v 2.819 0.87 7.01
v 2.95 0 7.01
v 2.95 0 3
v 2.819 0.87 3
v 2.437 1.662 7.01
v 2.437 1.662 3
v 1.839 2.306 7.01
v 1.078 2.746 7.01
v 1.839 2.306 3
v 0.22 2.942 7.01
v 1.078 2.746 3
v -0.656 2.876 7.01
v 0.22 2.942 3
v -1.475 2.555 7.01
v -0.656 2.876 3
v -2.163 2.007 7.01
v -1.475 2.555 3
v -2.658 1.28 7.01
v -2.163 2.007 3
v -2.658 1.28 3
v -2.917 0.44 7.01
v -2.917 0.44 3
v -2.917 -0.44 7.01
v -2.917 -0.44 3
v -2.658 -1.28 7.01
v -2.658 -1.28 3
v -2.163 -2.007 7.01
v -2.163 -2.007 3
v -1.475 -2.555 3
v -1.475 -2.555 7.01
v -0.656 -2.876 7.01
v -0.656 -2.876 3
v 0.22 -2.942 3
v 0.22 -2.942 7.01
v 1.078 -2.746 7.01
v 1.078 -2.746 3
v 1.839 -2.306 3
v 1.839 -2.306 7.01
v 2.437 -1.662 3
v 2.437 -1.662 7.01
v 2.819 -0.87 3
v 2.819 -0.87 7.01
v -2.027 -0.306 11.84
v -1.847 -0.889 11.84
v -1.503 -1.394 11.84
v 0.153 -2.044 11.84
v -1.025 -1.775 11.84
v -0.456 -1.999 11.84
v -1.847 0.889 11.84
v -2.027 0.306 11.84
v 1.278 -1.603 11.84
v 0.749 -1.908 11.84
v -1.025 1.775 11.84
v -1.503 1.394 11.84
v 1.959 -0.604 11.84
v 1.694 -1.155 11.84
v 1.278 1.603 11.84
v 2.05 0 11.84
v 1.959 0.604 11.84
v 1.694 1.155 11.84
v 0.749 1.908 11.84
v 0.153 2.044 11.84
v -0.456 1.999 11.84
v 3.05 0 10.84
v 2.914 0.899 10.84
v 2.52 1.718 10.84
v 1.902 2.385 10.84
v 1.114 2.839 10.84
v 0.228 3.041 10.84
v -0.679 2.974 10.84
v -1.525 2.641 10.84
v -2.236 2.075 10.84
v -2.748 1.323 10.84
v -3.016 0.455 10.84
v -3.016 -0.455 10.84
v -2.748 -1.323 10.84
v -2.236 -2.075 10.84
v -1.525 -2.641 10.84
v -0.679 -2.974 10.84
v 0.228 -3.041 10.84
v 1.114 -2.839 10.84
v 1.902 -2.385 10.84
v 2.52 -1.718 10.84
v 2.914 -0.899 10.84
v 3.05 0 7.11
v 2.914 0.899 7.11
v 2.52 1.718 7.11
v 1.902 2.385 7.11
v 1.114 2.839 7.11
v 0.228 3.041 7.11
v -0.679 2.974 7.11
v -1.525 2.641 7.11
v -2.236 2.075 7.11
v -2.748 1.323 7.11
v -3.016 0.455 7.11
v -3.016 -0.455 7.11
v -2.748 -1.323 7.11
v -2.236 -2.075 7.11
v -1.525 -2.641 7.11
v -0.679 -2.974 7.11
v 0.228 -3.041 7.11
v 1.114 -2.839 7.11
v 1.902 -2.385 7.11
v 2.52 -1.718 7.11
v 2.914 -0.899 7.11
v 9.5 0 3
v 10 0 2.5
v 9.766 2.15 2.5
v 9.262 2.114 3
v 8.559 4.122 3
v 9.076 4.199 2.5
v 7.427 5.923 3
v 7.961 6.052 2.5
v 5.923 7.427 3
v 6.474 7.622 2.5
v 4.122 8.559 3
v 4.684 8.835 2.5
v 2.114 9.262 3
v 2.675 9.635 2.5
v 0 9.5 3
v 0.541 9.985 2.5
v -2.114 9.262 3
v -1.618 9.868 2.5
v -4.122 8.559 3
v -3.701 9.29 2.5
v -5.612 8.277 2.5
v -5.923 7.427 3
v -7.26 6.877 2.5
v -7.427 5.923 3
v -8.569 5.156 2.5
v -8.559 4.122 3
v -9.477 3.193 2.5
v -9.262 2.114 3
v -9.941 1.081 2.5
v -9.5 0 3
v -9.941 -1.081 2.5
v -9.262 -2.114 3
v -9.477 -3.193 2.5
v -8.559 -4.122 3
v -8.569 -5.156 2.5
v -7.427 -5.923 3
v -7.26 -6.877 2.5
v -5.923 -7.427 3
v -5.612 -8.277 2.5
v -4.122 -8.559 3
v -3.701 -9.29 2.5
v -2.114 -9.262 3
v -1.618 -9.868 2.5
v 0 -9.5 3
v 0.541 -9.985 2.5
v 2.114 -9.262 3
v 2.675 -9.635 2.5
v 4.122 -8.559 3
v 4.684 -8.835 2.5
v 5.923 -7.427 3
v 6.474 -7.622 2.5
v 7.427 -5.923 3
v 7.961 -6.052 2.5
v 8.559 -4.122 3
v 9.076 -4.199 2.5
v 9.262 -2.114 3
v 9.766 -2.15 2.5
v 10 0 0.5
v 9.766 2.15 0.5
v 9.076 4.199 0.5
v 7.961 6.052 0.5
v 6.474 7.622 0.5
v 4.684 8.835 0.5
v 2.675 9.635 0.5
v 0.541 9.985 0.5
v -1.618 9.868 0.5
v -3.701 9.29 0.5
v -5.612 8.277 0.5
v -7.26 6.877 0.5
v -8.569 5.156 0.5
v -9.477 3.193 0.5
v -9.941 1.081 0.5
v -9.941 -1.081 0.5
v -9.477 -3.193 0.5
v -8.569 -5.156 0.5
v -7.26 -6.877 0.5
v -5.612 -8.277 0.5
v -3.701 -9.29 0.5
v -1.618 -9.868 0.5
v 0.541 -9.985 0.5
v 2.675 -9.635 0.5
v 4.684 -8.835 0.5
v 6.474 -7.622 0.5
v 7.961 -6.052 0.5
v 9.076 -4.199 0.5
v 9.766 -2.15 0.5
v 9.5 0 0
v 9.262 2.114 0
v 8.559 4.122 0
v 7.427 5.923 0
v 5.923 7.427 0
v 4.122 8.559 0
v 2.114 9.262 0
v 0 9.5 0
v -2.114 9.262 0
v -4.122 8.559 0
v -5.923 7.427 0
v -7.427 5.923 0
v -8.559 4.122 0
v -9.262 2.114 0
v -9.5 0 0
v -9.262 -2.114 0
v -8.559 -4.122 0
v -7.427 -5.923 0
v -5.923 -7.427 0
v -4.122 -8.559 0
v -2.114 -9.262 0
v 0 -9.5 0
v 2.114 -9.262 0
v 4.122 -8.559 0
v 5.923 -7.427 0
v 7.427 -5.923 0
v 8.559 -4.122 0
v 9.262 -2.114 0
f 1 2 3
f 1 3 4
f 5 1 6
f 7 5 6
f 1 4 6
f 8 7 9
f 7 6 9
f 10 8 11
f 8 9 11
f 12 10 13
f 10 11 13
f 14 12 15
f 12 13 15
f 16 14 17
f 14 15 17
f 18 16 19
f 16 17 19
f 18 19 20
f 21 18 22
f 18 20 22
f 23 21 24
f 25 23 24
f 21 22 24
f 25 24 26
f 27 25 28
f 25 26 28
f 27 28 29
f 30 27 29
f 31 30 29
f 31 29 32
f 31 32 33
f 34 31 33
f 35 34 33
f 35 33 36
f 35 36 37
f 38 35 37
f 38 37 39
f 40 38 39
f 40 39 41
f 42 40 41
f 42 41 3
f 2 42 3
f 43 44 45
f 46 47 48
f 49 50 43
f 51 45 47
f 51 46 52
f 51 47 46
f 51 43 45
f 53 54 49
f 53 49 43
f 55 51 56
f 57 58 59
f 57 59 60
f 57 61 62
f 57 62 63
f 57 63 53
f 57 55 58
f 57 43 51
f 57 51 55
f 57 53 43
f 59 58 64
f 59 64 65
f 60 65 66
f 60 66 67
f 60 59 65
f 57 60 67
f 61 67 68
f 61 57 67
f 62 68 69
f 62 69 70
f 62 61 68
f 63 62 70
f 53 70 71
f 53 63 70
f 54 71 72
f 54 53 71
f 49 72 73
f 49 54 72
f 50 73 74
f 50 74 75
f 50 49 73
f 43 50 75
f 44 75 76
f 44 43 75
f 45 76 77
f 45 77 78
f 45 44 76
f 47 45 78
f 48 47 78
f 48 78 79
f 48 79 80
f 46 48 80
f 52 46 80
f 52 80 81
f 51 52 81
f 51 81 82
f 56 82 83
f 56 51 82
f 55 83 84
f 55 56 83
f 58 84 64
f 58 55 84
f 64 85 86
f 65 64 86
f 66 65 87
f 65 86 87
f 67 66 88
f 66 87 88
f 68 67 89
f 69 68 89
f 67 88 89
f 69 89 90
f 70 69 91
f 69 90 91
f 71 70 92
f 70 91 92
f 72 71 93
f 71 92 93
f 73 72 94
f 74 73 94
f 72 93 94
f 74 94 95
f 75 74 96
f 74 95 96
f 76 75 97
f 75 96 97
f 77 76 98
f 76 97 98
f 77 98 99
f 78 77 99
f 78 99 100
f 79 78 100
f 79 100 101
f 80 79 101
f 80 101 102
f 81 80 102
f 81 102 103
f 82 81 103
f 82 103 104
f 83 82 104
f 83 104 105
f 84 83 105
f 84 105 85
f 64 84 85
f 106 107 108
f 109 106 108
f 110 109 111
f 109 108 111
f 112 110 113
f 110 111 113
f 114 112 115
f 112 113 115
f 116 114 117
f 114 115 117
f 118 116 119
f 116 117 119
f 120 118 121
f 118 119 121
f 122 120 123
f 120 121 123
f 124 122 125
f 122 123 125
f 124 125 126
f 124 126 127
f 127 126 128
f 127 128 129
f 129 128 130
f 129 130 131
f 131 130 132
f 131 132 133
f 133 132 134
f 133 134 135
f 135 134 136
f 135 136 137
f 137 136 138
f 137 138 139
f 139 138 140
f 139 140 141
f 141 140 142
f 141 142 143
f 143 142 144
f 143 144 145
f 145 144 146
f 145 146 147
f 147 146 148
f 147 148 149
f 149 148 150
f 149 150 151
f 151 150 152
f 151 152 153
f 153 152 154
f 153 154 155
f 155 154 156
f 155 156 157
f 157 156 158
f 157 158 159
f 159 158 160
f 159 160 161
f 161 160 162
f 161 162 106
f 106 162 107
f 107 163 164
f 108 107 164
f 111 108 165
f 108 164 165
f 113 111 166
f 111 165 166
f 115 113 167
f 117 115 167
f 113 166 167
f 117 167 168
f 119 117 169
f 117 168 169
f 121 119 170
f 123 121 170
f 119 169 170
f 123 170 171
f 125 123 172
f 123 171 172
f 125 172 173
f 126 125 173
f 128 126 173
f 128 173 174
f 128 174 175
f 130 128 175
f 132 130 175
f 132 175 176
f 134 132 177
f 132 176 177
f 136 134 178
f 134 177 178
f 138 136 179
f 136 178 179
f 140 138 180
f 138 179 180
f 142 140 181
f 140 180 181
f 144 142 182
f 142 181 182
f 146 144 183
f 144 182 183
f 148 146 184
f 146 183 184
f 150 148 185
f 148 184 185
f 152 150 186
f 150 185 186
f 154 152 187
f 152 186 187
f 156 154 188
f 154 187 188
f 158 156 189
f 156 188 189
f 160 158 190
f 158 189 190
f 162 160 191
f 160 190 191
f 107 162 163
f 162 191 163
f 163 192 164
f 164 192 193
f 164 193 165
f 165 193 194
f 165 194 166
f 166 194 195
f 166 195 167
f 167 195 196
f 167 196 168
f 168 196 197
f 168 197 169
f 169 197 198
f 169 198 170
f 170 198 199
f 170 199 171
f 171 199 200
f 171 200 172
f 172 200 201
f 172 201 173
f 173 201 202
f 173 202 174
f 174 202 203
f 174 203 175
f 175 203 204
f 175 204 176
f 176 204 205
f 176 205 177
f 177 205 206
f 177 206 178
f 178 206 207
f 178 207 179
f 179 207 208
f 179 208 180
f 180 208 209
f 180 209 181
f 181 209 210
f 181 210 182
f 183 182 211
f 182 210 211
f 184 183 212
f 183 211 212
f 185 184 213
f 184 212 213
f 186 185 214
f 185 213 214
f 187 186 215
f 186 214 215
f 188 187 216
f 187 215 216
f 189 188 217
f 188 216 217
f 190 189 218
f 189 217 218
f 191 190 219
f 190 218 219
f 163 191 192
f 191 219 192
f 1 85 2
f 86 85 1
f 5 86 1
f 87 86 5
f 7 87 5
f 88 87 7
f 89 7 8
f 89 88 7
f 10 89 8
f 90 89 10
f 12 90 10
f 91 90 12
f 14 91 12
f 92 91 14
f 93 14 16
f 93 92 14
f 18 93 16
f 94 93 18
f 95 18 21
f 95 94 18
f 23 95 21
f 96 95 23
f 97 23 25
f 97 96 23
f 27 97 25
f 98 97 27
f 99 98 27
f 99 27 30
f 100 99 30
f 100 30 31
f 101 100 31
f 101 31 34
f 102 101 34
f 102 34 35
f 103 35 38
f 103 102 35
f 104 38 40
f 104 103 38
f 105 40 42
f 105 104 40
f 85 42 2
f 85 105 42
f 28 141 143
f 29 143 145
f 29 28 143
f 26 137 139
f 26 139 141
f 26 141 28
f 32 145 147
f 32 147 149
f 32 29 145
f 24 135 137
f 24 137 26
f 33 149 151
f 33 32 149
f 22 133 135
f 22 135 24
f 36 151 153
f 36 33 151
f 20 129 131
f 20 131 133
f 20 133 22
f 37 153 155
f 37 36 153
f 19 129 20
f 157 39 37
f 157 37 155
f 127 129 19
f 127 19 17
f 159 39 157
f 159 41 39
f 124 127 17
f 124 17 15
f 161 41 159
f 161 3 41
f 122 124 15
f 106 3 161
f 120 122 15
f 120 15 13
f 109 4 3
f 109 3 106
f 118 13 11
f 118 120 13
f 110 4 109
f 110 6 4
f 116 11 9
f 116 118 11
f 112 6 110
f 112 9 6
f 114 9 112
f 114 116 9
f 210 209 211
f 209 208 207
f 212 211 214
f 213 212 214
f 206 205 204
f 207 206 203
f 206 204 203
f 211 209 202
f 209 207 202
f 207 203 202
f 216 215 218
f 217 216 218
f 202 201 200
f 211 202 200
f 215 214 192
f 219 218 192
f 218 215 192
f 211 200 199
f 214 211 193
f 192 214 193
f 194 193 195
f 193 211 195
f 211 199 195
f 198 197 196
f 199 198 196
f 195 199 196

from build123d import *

# Parameters (mm, degrees)
F0_R        = 10
F1_DEPTH    = 3
F2_R        = 2.95
F3_DEPTH    = 3.61
F4_R        = 3.05
F4_R_2      = 2.95
F5_DEPTH    = 5.23
F6_SIZE     = 1
F7_SIZE     = 0.5
F8_S5_R     = 2.95
F8_T6_DEPTH = 6


# Not quite as in the source:
# - a fillet or chamfer that OpenCascade refuses, or shapes differently, is made with other operations: its cross-section is extruded or revolved along the edge and cut away or added


with BuildPart() as f1:
    # F0 (on Top) → F1 (new body)
    with BuildSketch(Plane.XY):
        Circle(F0_R)
    extrude(amount=F1_DEPTH)

    # F2 (on face) → F3 (join)
    with BuildSketch(Plane.XY.offset(3)):
        Circle(F2_R)
    extrude(amount=F3_DEPTH)

    # F4 (on face) → F5 (join)
    with BuildSketch(Plane.XY.offset(6.61)):
        Circle(F4_R)
        Circle(F4_R_2, mode=Mode.SUBTRACT)
        Circle(F4_R_2)
    extrude(amount=F5_DEPTH)

    # F6
    f6_edges = [f1.edges().sort_by_distance(p)[0] for p in [
        (-3.05, 0, 11.84),
    ]]
    chamfer(f6_edges, length=F6_SIZE)

    # F7
    f7_edges = [f1.edges().sort_by_distance(p)[0] for p in [
        (-10, 0, 3),
        (-10, 0, 0),
    ]]
    chamfer(f7_edges, length=F7_SIZE)

    # F8: chamfer of 0.5 on 1 edges, made by hand


with BuildPart() as f8_tool2:
    # F8_s3 → F8_t4 (revolve)
    with BuildSketch(Plane.XZ):
        Polygon((2.55, 6.61), (3.05, 7.11), (3.05, 6.61), align=None)
    revolve(axis=Axis((0, 0, 6.61), (0, 0, 1)))

    # F8_s5 → F8_t6 (cut, symmetric)
    with BuildSketch(Plane.XY.offset(6.9)):
        Circle(F8_S5_R)
    extrude(amount=F8_T6_DEPTH, both=True, mode=Mode.SUBTRACT)


with BuildPart() as f1_1:
    add(f1.part)

    # F8_t1: cut F8_tool2
    add(f8_tool2.part, mode=Mode.SUBTRACT)


solid = f1_1.part
